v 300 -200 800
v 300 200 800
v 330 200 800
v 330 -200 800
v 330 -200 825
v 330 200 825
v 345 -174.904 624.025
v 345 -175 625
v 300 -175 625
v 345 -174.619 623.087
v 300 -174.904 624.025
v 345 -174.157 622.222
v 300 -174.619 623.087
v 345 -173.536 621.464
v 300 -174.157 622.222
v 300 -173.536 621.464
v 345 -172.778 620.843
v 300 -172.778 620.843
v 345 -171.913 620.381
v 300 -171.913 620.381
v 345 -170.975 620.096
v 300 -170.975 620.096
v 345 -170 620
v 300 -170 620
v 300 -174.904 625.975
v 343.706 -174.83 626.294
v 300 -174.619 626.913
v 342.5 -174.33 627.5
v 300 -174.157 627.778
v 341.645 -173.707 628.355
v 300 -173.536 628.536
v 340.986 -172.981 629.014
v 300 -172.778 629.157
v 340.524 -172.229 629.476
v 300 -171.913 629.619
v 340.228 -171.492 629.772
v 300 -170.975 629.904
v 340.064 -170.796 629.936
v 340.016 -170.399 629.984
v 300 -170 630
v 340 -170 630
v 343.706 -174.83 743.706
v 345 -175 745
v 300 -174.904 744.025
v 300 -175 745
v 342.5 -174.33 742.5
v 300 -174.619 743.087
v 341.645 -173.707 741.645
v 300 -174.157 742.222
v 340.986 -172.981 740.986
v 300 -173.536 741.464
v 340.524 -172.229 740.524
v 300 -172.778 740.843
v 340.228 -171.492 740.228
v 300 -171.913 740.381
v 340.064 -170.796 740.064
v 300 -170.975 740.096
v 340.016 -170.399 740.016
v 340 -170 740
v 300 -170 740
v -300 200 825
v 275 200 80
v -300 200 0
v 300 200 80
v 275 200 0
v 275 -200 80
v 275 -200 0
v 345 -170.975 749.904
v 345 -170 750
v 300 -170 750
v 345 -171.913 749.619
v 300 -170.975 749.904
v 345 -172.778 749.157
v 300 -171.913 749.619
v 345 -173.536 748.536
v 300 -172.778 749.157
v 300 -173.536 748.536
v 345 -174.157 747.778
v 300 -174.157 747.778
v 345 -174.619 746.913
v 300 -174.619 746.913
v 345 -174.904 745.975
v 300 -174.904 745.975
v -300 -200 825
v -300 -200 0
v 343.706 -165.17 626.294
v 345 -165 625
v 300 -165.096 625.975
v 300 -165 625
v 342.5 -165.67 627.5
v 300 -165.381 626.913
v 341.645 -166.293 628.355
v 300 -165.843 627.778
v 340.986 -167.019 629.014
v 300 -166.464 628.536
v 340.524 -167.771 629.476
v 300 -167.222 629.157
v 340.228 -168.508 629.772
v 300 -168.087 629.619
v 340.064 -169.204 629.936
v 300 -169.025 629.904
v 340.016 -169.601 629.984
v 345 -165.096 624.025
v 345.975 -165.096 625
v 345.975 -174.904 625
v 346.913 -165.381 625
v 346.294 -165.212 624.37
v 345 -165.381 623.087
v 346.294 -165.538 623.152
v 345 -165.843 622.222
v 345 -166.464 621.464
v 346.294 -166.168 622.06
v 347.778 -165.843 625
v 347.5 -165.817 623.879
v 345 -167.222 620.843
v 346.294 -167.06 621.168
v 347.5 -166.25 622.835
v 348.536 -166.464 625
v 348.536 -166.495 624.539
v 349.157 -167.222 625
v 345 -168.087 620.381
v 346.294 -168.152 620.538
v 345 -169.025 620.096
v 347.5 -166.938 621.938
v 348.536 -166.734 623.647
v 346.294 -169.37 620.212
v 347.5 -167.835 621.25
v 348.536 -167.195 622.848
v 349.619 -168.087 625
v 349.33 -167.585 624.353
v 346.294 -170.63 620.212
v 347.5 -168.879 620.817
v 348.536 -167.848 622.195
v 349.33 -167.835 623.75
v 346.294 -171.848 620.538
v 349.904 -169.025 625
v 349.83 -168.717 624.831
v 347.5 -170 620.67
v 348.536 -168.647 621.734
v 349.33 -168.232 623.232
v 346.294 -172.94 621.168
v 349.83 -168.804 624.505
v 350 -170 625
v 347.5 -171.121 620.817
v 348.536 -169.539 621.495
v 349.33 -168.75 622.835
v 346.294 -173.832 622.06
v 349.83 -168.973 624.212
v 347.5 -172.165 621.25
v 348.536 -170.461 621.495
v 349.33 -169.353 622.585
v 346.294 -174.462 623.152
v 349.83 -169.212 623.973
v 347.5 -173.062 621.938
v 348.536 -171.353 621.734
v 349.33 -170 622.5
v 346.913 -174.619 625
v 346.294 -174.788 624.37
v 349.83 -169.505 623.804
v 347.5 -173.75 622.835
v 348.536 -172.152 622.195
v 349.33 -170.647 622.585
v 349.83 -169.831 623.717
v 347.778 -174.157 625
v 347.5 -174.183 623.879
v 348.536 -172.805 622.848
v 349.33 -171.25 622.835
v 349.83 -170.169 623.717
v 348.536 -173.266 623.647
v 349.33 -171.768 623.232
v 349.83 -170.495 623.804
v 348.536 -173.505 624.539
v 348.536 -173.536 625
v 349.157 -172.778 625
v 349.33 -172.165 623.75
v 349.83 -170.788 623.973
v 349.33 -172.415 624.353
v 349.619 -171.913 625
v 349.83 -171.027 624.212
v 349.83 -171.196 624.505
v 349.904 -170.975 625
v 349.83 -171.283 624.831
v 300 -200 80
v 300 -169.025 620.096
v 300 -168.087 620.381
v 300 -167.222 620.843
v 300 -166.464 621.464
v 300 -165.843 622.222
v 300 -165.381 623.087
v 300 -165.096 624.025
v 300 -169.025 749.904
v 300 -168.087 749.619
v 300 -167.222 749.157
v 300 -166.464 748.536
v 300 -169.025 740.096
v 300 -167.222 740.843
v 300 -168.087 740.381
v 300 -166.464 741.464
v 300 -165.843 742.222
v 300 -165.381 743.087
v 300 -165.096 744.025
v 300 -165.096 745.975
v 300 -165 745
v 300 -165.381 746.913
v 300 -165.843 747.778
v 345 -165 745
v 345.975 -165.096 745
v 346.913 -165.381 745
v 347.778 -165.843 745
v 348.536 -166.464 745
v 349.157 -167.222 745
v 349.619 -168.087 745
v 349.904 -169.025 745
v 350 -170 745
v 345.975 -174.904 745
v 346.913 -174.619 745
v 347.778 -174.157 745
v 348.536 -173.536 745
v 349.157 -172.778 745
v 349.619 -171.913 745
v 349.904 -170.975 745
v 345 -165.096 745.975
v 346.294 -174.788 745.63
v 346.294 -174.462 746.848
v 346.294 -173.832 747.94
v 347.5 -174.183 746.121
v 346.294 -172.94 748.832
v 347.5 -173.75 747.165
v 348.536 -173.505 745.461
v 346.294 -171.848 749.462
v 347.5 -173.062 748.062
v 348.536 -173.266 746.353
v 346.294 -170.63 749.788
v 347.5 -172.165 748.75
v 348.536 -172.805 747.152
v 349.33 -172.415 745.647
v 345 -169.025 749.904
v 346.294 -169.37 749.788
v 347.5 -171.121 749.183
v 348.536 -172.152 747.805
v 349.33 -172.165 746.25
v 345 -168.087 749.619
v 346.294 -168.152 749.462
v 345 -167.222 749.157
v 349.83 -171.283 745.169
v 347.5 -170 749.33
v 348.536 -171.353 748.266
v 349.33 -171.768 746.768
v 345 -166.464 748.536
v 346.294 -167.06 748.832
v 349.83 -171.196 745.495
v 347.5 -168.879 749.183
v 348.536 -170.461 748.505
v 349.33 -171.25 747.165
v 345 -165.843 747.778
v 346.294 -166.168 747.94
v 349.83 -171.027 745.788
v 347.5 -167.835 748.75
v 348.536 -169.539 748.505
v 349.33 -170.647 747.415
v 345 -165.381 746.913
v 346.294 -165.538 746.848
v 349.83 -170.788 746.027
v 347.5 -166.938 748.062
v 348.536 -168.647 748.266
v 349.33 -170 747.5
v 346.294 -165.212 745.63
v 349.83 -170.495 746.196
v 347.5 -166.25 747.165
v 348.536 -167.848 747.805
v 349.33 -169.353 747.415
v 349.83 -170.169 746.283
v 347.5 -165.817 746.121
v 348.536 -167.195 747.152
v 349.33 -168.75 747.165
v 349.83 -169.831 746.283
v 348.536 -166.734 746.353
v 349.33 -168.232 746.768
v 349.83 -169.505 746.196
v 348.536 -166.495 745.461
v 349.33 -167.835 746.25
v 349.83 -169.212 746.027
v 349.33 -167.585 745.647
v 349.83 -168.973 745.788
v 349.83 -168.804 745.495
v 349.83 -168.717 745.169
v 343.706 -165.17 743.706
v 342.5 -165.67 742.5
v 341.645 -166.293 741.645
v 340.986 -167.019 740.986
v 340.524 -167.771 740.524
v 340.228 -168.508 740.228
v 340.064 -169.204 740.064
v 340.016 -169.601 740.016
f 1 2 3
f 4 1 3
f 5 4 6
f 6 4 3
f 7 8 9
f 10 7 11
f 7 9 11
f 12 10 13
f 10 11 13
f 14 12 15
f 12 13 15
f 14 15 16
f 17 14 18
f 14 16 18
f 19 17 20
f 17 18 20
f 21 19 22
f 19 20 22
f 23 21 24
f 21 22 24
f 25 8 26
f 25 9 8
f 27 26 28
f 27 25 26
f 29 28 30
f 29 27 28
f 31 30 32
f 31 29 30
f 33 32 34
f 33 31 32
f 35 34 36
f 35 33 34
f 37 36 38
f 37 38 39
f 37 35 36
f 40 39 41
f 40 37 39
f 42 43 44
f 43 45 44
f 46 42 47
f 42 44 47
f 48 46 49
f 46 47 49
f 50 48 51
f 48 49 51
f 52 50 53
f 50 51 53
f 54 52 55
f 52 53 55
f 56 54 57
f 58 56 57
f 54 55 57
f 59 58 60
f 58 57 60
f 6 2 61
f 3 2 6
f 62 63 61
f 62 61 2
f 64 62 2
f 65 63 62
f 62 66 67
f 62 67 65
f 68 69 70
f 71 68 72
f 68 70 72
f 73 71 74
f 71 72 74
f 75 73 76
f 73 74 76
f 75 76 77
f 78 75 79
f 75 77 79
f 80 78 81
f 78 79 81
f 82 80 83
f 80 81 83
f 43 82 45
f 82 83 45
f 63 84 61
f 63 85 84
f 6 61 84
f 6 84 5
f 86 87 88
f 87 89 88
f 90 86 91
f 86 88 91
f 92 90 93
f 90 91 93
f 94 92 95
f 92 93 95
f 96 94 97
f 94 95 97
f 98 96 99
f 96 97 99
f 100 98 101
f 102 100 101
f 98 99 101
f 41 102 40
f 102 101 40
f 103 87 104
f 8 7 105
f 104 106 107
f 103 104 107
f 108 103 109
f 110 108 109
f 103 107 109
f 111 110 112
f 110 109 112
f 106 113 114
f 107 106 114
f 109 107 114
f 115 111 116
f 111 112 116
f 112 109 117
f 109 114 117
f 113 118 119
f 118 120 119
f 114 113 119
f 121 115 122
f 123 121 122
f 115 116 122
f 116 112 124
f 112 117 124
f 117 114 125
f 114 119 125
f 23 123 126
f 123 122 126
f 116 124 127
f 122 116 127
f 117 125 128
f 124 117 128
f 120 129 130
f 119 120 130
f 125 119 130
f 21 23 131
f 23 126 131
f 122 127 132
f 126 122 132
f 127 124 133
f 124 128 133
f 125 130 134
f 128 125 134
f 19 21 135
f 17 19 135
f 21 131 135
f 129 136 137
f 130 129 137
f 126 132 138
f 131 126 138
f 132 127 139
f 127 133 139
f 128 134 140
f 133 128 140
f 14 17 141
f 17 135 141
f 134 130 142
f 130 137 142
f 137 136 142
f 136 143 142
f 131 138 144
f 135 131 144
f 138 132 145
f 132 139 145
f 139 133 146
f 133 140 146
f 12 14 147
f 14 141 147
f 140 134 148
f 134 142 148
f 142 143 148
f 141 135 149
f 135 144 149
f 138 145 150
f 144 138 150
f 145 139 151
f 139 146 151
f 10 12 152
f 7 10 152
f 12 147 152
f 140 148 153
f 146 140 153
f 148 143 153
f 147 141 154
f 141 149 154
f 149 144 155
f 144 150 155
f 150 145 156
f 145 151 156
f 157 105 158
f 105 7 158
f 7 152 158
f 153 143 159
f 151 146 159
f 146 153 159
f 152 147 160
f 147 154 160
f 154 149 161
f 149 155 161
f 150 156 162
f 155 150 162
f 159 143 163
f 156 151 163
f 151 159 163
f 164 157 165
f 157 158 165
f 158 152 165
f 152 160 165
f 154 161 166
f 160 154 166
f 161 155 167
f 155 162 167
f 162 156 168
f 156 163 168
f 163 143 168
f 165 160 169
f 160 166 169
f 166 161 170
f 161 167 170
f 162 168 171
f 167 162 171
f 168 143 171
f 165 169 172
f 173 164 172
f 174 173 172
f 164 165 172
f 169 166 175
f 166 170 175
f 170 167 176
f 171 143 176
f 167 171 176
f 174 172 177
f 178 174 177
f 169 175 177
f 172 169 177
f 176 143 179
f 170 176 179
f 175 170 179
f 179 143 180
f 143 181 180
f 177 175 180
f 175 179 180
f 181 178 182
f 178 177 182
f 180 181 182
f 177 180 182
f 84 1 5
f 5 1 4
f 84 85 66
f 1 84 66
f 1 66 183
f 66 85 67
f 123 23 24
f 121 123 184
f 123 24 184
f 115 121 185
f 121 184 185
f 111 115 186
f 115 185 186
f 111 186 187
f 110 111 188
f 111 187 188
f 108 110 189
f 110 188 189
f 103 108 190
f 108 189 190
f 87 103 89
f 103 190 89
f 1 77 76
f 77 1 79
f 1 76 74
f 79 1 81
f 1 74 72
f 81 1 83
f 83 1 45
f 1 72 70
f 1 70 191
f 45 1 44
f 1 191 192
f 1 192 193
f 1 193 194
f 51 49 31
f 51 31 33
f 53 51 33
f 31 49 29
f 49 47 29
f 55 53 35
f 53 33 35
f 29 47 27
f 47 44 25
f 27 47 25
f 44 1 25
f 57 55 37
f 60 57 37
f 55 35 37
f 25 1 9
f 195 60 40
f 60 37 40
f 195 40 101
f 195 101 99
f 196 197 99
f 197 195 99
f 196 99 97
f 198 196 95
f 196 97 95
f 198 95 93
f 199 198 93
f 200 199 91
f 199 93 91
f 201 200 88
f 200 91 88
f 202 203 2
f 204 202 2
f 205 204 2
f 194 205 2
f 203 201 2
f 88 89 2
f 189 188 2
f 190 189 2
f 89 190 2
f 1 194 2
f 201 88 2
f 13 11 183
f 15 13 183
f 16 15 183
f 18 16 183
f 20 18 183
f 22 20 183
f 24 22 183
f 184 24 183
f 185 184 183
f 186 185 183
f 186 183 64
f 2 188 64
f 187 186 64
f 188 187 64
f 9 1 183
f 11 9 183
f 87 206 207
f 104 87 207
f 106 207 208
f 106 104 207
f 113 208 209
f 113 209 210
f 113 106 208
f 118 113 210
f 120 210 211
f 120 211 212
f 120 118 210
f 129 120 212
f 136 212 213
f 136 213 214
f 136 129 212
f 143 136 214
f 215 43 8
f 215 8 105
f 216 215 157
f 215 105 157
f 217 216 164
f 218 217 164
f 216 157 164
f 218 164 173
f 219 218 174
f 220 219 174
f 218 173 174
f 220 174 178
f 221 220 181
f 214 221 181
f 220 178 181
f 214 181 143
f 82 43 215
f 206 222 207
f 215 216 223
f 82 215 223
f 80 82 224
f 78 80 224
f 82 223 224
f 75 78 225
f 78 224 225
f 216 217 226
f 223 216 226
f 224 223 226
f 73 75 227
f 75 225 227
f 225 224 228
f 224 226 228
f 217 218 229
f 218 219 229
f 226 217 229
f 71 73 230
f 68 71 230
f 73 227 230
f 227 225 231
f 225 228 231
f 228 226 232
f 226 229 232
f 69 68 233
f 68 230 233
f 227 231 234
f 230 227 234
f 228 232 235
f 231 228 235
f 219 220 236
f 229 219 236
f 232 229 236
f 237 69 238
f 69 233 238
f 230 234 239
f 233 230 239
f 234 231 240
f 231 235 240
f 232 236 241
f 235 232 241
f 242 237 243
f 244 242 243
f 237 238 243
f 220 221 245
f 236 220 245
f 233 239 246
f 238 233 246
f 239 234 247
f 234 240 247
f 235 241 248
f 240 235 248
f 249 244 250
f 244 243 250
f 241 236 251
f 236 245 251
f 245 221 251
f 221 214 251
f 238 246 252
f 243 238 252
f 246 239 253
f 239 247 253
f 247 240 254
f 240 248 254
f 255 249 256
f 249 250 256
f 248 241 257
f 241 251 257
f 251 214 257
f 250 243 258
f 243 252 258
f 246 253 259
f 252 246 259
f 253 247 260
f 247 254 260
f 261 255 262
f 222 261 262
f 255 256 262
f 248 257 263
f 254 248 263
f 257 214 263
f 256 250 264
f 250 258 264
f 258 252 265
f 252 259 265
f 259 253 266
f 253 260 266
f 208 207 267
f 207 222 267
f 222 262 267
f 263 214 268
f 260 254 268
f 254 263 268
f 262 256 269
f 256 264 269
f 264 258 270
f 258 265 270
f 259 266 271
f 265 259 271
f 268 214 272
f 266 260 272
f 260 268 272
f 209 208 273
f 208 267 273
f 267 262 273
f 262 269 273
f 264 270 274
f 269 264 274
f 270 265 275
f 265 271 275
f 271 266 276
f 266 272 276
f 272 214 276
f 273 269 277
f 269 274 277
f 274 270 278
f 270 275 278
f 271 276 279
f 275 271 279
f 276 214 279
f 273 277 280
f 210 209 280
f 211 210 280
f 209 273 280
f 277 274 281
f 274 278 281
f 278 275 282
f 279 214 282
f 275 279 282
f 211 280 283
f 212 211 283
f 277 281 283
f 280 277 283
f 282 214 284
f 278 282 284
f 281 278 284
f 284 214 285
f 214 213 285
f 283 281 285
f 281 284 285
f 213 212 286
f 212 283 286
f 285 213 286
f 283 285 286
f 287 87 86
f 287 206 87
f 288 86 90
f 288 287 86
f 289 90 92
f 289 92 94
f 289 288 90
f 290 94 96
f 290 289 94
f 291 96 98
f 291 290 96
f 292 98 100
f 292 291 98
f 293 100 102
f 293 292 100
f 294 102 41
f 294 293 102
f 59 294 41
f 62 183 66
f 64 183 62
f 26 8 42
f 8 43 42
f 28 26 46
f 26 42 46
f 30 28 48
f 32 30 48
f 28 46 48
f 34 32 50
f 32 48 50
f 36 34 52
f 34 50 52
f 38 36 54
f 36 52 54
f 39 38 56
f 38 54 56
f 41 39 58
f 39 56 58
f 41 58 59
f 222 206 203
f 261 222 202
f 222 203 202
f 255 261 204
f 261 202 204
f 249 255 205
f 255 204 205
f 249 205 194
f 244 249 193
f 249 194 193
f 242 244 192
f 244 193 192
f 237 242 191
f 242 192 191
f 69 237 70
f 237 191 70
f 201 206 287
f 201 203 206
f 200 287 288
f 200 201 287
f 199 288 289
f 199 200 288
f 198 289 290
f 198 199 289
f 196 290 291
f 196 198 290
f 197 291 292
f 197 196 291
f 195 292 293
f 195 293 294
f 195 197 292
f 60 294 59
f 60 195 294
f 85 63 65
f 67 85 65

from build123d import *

# Parameters (mm, degrees)
F0_W        = 600
F0_H        = 400
F1_DEPTH    = 800
F2_W        = 400
F2_H        = 80
F3_DEPTH    = 25
F5_DEPTH    = 50
F6_T1_DEPTH = 120
F6_T4_ANGLE = 180
F6_T6_ANGLE = 180
F7_W        = 40
F7_H        = 110
F8_DEPTH    = 25
F9_R        = 4.99999
F10_W       = 630
F10_H       = 400
F11_DEPTH   = 25


# Not quite as in the source:
# - a fillet or chamfer that OpenCascade refuses, or shapes differently, is made with other operations: its cross-section is extruded or revolved along the edge and cut away or added
# - a fillet or chamfer is up to 0.001 mm smaller than in the source, because OpenCascade refuses the exact size


with BuildPart() as f1:
    # F0 (on Top) → F1 (new body)
    with BuildSketch(Plane.XY):
        Rectangle(F0_W, F0_H)
    extrude(amount=F1_DEPTH)

    # F2 (on face) → F3 (cut)
    with BuildSketch(Plane.YZ.offset(300)):
        with Locations((0, 40)):
            Rectangle(F2_W, F2_H)
    extrude(amount=-F3_DEPTH, mode=Mode.SUBTRACT)

    # F4 (on face) → F5 (join)
    with BuildSketch(Plane.YZ.offset(300)):
        with BuildLine():
            ThreePointArc((-170, 750), (-173.5355339059, 748.5355339059), (-175, 745))
            Line((-175, 745), (-175, 625))
            ThreePointArc((-175, 625), (-173.5355339059, 621.4644660941), (-170, 620))
            ThreePointArc((-170, 620), (-166.4644660941, 621.4644660941), (-165, 625))
            Line((-165, 625), (-165, 745))
            ThreePointArc((-165, 745), (-166.4644660941, 748.5355339059), (-170, 750))
        make_face()
    extrude(amount=F5_DEPTH)

    # F6: fillet of radius 5 on 4 edges, made by hand

    # F6_s2 → F6_t1 (cut)
    with BuildSketch(Plane.XY.offset(625)):
        with BuildLine():
            ThreePointArc((345, -175), (348.5355339059, -173.5355339059), (350, -170))
            Line((350, -170), (350, -175))
            Line((350, -175), (345, -175))
        make_face()
        with BuildLine():
            ThreePointArc((345, -165), (348.5355339059, -166.4644660941), (350, -170))
            Line((350, -170), (350, -165))
            Line((350, -165), (345, -165))
        make_face()
    extrude(amount=F6_T1_DEPTH, mode=Mode.SUBTRACT)

    # F6_s3 → F6_t4 (revolve, cut)
    with BuildSketch(Plane.XY.offset(745)):
        with BuildLine():
            ThreePointArc((345, -175), (348.5355339059, -173.5355339059), (350, -170))
            Line((350, -170), (350, -175))
            Line((350, -175), (345, -175))
        make_face()
    revolve(axis=Axis((350, -170, 745), (-1, 0, 0)), revolution_arc=F6_T4_ANGLE, mode=Mode.SUBTRACT)

    # F6_s5 → F6_t6 (revolve, cut)
    with BuildSketch(Plane.XY.offset(625)):
        with BuildLine():
            ThreePointArc((345, -165), (348.5355339059, -166.4644660941), (350, -170))
            Line((350, -170), (350, -165))
            Line((350, -165), (345, -165))
        make_face()
    revolve(axis=Axis((350, -170, 625), (-1, 0, 0)), revolution_arc=F6_T6_ANGLE, mode=Mode.SUBTRACT)

    # F7 (on face) → F8 (cut)
    with BuildSketch(Plane(origin=(0, -165, 0), x_dir=(-1, 0, 0), z_dir=(0, 1, 0))):
        with Locations((-320, 685)):
            Rectangle(F7_W, F7_H)
    extrude(amount=-F8_DEPTH, mode=Mode.SUBTRACT)

    # F9 (radius 5 in the source; OpenCascade refuses exactly that, so slightly less here)
    f9_edges = [f1.edges().sort_by_distance(p)[0] for p in [
        (320, -165, 740),
        (340, -165, 685),
        (320, -165, 630),
        (320, -175, 740),
        (340, -175, 685),
        (320, -175, 630),
    ]]
    fillet(f9_edges, radius=F9_R)

    # F10 (on face) → F11 (join)
    with BuildSketch(Plane.XY.offset(800)):
        with Locations((15, 0)):
            Rectangle(F10_W, F10_H)
    extrude(amount=F11_DEPTH)


solid = f1.part
